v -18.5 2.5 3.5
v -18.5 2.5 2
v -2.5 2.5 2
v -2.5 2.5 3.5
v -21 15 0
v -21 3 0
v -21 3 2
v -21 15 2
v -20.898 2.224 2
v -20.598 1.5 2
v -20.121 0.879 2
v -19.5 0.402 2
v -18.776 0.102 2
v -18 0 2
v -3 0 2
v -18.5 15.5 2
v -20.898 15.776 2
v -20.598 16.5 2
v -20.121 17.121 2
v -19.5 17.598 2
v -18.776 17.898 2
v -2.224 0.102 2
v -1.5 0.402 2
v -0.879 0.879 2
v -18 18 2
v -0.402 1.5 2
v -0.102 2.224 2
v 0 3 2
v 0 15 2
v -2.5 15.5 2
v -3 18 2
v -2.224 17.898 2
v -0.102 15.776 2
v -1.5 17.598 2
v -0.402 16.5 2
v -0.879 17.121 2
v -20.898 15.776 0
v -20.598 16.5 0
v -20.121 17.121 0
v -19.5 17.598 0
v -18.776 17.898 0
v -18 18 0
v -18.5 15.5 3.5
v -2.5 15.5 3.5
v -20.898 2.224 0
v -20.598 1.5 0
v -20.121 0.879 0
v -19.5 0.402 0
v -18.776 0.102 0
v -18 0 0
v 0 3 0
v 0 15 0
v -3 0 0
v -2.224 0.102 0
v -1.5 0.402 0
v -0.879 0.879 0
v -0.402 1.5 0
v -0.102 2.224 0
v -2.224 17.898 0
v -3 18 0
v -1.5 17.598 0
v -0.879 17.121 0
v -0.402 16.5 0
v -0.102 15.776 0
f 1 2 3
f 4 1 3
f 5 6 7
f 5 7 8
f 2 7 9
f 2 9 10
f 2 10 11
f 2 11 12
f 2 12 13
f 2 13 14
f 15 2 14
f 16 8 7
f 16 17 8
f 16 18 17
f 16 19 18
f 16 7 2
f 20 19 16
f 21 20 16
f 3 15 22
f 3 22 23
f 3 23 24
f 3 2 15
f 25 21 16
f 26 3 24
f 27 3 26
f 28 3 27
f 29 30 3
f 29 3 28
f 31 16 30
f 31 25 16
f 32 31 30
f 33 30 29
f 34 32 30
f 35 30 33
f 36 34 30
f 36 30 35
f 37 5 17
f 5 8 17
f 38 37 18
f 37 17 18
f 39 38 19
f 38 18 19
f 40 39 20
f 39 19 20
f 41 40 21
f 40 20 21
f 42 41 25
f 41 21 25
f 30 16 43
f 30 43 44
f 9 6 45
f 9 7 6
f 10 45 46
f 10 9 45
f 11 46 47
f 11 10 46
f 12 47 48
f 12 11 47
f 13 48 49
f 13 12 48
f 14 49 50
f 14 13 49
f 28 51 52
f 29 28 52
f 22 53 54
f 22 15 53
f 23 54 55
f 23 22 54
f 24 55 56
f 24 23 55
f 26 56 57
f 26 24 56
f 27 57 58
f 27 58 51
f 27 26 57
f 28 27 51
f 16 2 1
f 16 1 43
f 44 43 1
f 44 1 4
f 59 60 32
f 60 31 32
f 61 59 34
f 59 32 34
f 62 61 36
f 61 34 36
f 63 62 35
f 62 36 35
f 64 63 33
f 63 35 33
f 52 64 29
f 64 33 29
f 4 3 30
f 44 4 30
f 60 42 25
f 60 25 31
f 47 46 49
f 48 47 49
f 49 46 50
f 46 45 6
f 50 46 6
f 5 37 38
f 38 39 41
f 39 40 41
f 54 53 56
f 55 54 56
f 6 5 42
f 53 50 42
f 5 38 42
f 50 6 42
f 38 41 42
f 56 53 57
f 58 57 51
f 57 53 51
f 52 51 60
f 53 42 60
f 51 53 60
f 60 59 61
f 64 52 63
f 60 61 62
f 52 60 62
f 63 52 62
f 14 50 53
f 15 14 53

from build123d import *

# Parameters (mm, degrees)
SKETCH_W     = 21
SKETCH_H     = 18
PAD_DEPTH    = 2
SKETCH001_W  = 16
SKETCH001_H  = 13
PAD001_DEPTH = 1.5
FILLET_R     = 3


with BuildPart() as part:
    # Sketch → Pad (new body)
    with BuildSketch(Plane.XY):
        with Locations((-10.5, 9)):
            Rectangle(SKETCH_W, SKETCH_H)
    extrude(amount=PAD_DEPTH)

    # Sketch001 (on Face6 of Pad) → Pad001 (join)
    with BuildSketch(Plane.XY.offset(2)):
        with Locations((-10.5, 9)):
            Rectangle(SKETCH001_W, SKETCH001_H)
    extrude(amount=PAD001_DEPTH)

    # Fillet
    fillet_edges = [part.edges().sort_by_distance(p)[0] for p in [
        (0, 18, 1),
        (0, 0, 1),
        (-21, 0, 1),
        (-21, 18, 1),
    ]]
    fillet(fillet_edges, radius=FILLET_R)


solid = part.part
